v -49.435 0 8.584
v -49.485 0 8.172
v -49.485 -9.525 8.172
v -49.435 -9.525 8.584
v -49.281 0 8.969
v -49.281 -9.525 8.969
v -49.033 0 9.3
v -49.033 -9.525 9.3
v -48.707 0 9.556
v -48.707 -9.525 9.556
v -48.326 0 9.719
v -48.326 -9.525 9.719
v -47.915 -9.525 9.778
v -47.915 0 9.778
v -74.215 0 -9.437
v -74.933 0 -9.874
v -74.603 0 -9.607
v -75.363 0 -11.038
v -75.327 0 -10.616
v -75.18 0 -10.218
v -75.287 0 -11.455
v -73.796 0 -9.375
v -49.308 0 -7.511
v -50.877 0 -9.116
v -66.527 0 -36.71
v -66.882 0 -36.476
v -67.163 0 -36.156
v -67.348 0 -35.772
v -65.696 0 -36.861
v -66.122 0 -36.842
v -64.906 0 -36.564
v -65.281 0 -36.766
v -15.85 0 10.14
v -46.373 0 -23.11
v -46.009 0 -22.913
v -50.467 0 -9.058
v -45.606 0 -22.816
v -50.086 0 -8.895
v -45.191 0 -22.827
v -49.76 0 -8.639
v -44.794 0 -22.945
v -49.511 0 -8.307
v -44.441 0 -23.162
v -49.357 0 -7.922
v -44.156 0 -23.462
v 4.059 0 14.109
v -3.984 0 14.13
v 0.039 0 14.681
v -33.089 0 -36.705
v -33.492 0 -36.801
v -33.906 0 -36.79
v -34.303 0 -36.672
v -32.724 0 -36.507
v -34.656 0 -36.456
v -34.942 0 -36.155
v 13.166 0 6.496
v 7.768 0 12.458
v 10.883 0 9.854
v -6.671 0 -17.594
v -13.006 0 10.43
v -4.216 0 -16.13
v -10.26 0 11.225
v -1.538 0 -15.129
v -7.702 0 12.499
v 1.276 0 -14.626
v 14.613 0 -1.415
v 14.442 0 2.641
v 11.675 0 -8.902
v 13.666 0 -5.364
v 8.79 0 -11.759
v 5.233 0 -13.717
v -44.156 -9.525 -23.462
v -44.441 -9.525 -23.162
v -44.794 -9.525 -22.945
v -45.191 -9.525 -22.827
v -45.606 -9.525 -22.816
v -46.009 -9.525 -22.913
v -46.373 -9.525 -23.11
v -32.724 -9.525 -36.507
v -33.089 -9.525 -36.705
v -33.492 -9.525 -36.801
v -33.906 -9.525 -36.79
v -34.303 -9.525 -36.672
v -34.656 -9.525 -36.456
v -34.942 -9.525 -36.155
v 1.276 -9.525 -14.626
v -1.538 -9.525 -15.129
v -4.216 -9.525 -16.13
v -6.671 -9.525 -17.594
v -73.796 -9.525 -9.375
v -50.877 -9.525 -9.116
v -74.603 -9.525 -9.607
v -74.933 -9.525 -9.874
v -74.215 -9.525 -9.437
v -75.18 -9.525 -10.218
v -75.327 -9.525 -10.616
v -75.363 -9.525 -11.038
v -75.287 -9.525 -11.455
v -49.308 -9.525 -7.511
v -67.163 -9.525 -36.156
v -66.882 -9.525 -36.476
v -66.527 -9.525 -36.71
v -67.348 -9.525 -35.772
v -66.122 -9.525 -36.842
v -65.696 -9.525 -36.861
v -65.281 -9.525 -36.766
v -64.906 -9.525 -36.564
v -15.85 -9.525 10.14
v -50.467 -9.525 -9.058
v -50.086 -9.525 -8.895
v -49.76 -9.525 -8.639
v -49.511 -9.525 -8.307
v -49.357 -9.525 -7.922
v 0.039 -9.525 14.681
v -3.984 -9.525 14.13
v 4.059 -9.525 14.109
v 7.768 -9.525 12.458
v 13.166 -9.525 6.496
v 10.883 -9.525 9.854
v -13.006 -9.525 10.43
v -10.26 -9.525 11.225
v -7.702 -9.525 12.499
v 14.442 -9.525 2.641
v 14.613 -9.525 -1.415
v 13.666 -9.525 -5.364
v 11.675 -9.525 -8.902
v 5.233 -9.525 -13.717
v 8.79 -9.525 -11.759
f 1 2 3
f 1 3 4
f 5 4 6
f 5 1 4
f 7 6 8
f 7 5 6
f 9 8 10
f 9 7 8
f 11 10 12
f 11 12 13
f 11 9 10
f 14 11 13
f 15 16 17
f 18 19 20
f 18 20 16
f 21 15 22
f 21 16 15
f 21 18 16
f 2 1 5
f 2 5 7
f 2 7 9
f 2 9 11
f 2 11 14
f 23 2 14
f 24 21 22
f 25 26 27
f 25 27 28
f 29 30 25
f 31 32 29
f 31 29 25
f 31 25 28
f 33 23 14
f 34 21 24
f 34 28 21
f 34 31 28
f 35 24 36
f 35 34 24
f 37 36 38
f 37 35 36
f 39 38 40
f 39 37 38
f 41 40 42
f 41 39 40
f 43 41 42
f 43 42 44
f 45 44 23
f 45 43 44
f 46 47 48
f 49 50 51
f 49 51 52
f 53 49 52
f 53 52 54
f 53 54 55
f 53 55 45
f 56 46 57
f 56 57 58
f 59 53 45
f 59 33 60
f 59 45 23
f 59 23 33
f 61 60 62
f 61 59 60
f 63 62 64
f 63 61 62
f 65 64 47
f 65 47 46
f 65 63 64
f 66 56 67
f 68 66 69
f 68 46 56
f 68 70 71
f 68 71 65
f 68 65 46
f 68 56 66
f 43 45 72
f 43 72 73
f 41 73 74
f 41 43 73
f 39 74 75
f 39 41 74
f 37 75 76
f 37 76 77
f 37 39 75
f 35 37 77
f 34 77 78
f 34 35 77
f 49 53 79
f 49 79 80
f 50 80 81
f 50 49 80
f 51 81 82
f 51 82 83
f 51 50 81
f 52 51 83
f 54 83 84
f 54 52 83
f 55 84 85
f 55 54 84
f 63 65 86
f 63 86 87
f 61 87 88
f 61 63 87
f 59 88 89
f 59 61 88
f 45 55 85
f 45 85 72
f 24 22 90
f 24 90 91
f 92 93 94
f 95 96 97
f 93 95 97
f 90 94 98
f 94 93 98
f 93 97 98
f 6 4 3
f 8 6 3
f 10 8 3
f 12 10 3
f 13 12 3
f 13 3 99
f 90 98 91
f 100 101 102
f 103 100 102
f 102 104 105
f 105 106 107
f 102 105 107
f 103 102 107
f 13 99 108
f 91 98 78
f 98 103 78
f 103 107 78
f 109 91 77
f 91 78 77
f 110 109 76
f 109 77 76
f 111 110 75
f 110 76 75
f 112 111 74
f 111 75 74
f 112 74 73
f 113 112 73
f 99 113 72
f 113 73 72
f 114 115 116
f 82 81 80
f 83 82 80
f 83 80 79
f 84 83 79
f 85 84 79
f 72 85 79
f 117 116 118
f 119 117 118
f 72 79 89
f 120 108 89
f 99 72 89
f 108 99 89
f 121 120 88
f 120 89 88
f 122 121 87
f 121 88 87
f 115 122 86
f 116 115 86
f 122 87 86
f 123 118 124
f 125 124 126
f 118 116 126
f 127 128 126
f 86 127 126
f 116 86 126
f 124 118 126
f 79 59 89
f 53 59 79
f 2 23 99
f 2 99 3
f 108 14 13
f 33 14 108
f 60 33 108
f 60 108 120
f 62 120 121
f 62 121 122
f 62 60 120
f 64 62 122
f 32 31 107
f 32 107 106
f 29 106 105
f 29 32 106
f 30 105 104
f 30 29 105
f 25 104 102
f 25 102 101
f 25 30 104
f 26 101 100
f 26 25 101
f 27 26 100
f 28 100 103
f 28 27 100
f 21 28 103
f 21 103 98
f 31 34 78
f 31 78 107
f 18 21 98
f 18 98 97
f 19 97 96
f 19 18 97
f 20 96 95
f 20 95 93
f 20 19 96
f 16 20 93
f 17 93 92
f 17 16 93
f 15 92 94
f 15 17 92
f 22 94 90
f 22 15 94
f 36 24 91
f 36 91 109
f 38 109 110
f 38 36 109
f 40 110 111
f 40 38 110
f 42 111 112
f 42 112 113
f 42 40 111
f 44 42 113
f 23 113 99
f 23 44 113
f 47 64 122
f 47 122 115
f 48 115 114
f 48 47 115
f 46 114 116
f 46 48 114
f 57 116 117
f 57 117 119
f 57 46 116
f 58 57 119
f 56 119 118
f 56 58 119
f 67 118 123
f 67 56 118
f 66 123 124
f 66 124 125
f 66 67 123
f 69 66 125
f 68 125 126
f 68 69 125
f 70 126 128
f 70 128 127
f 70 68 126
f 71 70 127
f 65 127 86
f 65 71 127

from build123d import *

# Parameters (mm, degrees)
BOSS_EXTRUDE1_DEPTH = 9.525


with BuildPart() as part:
    # Sketch1 → Boss-Extrude1 (new body)
    with BuildSketch(Plane(origin=(0, 0, 0), x_dir=(1, 0, 0), z_dir=(0, 1, 0))):
        with BuildLine():
            Line((-46.373035196, 23.110309708), (-64.906111076, 36.564296932))
            ThreePointArc((-64.906111076, 36.564296932), (-66.328511848, 36.789669498), (-67.347825731, 35.772312158))
            Line((-67.347825731, 35.772312158), (-75.28680268, 11.455483186))
            ThreePointArc((-75.28680268, 11.455483186), (-75.067914414, 10.037862192), (-73.795636305, 9.375389727))
            Line((-73.795636305, 9.375389727), (-50.87703604, 9.116346342))
            ThreePointArc((-50.87703604, 9.116346342), (-49.759830806, 8.638721158), (-49.307579416, 7.511005754))
            Line((-49.307579416, 7.511005754), (-49.484846196, -8.172492476))
            ThreePointArc((-49.484846196, -8.172492476), (-49.032594805, -9.30020788), (-47.915389571, -9.777833064))
            Line((-47.915389571, -9.777833064), (-15.849937724, -10.140261096))
            ThreePointArc((-15.849937724, -10.140261096), (-11.615281586, -10.76526167), (-7.701553332, -12.498948344))
            ThreePointArc((-7.701553332, -12.498948344), (13.937693435, -4.612844582), (1.275661223, 14.625673382))
            ThreePointArc((1.275661223, 14.625673382), (-2.899601677, 15.569134056), (-6.671010295, 17.593835357))
            Line((-6.671010295, 17.593835357), (-32.724313124, 36.507091078))
            ThreePointArc((-32.724313124, 36.507091078), (-33.90587286, 36.790269364), (-34.941599049, 36.155017749))
            Line((-34.941599049, 36.155017749), (-44.155749271, 23.462383037))
            ThreePointArc((-44.155749271, 23.462383037), (-45.19147546, 22.827131422), (-46.373035196, 23.110309708))
        make_face()
    extrude(amount=-BOSS_EXTRUDE1_DEPTH)


solid = part.part
